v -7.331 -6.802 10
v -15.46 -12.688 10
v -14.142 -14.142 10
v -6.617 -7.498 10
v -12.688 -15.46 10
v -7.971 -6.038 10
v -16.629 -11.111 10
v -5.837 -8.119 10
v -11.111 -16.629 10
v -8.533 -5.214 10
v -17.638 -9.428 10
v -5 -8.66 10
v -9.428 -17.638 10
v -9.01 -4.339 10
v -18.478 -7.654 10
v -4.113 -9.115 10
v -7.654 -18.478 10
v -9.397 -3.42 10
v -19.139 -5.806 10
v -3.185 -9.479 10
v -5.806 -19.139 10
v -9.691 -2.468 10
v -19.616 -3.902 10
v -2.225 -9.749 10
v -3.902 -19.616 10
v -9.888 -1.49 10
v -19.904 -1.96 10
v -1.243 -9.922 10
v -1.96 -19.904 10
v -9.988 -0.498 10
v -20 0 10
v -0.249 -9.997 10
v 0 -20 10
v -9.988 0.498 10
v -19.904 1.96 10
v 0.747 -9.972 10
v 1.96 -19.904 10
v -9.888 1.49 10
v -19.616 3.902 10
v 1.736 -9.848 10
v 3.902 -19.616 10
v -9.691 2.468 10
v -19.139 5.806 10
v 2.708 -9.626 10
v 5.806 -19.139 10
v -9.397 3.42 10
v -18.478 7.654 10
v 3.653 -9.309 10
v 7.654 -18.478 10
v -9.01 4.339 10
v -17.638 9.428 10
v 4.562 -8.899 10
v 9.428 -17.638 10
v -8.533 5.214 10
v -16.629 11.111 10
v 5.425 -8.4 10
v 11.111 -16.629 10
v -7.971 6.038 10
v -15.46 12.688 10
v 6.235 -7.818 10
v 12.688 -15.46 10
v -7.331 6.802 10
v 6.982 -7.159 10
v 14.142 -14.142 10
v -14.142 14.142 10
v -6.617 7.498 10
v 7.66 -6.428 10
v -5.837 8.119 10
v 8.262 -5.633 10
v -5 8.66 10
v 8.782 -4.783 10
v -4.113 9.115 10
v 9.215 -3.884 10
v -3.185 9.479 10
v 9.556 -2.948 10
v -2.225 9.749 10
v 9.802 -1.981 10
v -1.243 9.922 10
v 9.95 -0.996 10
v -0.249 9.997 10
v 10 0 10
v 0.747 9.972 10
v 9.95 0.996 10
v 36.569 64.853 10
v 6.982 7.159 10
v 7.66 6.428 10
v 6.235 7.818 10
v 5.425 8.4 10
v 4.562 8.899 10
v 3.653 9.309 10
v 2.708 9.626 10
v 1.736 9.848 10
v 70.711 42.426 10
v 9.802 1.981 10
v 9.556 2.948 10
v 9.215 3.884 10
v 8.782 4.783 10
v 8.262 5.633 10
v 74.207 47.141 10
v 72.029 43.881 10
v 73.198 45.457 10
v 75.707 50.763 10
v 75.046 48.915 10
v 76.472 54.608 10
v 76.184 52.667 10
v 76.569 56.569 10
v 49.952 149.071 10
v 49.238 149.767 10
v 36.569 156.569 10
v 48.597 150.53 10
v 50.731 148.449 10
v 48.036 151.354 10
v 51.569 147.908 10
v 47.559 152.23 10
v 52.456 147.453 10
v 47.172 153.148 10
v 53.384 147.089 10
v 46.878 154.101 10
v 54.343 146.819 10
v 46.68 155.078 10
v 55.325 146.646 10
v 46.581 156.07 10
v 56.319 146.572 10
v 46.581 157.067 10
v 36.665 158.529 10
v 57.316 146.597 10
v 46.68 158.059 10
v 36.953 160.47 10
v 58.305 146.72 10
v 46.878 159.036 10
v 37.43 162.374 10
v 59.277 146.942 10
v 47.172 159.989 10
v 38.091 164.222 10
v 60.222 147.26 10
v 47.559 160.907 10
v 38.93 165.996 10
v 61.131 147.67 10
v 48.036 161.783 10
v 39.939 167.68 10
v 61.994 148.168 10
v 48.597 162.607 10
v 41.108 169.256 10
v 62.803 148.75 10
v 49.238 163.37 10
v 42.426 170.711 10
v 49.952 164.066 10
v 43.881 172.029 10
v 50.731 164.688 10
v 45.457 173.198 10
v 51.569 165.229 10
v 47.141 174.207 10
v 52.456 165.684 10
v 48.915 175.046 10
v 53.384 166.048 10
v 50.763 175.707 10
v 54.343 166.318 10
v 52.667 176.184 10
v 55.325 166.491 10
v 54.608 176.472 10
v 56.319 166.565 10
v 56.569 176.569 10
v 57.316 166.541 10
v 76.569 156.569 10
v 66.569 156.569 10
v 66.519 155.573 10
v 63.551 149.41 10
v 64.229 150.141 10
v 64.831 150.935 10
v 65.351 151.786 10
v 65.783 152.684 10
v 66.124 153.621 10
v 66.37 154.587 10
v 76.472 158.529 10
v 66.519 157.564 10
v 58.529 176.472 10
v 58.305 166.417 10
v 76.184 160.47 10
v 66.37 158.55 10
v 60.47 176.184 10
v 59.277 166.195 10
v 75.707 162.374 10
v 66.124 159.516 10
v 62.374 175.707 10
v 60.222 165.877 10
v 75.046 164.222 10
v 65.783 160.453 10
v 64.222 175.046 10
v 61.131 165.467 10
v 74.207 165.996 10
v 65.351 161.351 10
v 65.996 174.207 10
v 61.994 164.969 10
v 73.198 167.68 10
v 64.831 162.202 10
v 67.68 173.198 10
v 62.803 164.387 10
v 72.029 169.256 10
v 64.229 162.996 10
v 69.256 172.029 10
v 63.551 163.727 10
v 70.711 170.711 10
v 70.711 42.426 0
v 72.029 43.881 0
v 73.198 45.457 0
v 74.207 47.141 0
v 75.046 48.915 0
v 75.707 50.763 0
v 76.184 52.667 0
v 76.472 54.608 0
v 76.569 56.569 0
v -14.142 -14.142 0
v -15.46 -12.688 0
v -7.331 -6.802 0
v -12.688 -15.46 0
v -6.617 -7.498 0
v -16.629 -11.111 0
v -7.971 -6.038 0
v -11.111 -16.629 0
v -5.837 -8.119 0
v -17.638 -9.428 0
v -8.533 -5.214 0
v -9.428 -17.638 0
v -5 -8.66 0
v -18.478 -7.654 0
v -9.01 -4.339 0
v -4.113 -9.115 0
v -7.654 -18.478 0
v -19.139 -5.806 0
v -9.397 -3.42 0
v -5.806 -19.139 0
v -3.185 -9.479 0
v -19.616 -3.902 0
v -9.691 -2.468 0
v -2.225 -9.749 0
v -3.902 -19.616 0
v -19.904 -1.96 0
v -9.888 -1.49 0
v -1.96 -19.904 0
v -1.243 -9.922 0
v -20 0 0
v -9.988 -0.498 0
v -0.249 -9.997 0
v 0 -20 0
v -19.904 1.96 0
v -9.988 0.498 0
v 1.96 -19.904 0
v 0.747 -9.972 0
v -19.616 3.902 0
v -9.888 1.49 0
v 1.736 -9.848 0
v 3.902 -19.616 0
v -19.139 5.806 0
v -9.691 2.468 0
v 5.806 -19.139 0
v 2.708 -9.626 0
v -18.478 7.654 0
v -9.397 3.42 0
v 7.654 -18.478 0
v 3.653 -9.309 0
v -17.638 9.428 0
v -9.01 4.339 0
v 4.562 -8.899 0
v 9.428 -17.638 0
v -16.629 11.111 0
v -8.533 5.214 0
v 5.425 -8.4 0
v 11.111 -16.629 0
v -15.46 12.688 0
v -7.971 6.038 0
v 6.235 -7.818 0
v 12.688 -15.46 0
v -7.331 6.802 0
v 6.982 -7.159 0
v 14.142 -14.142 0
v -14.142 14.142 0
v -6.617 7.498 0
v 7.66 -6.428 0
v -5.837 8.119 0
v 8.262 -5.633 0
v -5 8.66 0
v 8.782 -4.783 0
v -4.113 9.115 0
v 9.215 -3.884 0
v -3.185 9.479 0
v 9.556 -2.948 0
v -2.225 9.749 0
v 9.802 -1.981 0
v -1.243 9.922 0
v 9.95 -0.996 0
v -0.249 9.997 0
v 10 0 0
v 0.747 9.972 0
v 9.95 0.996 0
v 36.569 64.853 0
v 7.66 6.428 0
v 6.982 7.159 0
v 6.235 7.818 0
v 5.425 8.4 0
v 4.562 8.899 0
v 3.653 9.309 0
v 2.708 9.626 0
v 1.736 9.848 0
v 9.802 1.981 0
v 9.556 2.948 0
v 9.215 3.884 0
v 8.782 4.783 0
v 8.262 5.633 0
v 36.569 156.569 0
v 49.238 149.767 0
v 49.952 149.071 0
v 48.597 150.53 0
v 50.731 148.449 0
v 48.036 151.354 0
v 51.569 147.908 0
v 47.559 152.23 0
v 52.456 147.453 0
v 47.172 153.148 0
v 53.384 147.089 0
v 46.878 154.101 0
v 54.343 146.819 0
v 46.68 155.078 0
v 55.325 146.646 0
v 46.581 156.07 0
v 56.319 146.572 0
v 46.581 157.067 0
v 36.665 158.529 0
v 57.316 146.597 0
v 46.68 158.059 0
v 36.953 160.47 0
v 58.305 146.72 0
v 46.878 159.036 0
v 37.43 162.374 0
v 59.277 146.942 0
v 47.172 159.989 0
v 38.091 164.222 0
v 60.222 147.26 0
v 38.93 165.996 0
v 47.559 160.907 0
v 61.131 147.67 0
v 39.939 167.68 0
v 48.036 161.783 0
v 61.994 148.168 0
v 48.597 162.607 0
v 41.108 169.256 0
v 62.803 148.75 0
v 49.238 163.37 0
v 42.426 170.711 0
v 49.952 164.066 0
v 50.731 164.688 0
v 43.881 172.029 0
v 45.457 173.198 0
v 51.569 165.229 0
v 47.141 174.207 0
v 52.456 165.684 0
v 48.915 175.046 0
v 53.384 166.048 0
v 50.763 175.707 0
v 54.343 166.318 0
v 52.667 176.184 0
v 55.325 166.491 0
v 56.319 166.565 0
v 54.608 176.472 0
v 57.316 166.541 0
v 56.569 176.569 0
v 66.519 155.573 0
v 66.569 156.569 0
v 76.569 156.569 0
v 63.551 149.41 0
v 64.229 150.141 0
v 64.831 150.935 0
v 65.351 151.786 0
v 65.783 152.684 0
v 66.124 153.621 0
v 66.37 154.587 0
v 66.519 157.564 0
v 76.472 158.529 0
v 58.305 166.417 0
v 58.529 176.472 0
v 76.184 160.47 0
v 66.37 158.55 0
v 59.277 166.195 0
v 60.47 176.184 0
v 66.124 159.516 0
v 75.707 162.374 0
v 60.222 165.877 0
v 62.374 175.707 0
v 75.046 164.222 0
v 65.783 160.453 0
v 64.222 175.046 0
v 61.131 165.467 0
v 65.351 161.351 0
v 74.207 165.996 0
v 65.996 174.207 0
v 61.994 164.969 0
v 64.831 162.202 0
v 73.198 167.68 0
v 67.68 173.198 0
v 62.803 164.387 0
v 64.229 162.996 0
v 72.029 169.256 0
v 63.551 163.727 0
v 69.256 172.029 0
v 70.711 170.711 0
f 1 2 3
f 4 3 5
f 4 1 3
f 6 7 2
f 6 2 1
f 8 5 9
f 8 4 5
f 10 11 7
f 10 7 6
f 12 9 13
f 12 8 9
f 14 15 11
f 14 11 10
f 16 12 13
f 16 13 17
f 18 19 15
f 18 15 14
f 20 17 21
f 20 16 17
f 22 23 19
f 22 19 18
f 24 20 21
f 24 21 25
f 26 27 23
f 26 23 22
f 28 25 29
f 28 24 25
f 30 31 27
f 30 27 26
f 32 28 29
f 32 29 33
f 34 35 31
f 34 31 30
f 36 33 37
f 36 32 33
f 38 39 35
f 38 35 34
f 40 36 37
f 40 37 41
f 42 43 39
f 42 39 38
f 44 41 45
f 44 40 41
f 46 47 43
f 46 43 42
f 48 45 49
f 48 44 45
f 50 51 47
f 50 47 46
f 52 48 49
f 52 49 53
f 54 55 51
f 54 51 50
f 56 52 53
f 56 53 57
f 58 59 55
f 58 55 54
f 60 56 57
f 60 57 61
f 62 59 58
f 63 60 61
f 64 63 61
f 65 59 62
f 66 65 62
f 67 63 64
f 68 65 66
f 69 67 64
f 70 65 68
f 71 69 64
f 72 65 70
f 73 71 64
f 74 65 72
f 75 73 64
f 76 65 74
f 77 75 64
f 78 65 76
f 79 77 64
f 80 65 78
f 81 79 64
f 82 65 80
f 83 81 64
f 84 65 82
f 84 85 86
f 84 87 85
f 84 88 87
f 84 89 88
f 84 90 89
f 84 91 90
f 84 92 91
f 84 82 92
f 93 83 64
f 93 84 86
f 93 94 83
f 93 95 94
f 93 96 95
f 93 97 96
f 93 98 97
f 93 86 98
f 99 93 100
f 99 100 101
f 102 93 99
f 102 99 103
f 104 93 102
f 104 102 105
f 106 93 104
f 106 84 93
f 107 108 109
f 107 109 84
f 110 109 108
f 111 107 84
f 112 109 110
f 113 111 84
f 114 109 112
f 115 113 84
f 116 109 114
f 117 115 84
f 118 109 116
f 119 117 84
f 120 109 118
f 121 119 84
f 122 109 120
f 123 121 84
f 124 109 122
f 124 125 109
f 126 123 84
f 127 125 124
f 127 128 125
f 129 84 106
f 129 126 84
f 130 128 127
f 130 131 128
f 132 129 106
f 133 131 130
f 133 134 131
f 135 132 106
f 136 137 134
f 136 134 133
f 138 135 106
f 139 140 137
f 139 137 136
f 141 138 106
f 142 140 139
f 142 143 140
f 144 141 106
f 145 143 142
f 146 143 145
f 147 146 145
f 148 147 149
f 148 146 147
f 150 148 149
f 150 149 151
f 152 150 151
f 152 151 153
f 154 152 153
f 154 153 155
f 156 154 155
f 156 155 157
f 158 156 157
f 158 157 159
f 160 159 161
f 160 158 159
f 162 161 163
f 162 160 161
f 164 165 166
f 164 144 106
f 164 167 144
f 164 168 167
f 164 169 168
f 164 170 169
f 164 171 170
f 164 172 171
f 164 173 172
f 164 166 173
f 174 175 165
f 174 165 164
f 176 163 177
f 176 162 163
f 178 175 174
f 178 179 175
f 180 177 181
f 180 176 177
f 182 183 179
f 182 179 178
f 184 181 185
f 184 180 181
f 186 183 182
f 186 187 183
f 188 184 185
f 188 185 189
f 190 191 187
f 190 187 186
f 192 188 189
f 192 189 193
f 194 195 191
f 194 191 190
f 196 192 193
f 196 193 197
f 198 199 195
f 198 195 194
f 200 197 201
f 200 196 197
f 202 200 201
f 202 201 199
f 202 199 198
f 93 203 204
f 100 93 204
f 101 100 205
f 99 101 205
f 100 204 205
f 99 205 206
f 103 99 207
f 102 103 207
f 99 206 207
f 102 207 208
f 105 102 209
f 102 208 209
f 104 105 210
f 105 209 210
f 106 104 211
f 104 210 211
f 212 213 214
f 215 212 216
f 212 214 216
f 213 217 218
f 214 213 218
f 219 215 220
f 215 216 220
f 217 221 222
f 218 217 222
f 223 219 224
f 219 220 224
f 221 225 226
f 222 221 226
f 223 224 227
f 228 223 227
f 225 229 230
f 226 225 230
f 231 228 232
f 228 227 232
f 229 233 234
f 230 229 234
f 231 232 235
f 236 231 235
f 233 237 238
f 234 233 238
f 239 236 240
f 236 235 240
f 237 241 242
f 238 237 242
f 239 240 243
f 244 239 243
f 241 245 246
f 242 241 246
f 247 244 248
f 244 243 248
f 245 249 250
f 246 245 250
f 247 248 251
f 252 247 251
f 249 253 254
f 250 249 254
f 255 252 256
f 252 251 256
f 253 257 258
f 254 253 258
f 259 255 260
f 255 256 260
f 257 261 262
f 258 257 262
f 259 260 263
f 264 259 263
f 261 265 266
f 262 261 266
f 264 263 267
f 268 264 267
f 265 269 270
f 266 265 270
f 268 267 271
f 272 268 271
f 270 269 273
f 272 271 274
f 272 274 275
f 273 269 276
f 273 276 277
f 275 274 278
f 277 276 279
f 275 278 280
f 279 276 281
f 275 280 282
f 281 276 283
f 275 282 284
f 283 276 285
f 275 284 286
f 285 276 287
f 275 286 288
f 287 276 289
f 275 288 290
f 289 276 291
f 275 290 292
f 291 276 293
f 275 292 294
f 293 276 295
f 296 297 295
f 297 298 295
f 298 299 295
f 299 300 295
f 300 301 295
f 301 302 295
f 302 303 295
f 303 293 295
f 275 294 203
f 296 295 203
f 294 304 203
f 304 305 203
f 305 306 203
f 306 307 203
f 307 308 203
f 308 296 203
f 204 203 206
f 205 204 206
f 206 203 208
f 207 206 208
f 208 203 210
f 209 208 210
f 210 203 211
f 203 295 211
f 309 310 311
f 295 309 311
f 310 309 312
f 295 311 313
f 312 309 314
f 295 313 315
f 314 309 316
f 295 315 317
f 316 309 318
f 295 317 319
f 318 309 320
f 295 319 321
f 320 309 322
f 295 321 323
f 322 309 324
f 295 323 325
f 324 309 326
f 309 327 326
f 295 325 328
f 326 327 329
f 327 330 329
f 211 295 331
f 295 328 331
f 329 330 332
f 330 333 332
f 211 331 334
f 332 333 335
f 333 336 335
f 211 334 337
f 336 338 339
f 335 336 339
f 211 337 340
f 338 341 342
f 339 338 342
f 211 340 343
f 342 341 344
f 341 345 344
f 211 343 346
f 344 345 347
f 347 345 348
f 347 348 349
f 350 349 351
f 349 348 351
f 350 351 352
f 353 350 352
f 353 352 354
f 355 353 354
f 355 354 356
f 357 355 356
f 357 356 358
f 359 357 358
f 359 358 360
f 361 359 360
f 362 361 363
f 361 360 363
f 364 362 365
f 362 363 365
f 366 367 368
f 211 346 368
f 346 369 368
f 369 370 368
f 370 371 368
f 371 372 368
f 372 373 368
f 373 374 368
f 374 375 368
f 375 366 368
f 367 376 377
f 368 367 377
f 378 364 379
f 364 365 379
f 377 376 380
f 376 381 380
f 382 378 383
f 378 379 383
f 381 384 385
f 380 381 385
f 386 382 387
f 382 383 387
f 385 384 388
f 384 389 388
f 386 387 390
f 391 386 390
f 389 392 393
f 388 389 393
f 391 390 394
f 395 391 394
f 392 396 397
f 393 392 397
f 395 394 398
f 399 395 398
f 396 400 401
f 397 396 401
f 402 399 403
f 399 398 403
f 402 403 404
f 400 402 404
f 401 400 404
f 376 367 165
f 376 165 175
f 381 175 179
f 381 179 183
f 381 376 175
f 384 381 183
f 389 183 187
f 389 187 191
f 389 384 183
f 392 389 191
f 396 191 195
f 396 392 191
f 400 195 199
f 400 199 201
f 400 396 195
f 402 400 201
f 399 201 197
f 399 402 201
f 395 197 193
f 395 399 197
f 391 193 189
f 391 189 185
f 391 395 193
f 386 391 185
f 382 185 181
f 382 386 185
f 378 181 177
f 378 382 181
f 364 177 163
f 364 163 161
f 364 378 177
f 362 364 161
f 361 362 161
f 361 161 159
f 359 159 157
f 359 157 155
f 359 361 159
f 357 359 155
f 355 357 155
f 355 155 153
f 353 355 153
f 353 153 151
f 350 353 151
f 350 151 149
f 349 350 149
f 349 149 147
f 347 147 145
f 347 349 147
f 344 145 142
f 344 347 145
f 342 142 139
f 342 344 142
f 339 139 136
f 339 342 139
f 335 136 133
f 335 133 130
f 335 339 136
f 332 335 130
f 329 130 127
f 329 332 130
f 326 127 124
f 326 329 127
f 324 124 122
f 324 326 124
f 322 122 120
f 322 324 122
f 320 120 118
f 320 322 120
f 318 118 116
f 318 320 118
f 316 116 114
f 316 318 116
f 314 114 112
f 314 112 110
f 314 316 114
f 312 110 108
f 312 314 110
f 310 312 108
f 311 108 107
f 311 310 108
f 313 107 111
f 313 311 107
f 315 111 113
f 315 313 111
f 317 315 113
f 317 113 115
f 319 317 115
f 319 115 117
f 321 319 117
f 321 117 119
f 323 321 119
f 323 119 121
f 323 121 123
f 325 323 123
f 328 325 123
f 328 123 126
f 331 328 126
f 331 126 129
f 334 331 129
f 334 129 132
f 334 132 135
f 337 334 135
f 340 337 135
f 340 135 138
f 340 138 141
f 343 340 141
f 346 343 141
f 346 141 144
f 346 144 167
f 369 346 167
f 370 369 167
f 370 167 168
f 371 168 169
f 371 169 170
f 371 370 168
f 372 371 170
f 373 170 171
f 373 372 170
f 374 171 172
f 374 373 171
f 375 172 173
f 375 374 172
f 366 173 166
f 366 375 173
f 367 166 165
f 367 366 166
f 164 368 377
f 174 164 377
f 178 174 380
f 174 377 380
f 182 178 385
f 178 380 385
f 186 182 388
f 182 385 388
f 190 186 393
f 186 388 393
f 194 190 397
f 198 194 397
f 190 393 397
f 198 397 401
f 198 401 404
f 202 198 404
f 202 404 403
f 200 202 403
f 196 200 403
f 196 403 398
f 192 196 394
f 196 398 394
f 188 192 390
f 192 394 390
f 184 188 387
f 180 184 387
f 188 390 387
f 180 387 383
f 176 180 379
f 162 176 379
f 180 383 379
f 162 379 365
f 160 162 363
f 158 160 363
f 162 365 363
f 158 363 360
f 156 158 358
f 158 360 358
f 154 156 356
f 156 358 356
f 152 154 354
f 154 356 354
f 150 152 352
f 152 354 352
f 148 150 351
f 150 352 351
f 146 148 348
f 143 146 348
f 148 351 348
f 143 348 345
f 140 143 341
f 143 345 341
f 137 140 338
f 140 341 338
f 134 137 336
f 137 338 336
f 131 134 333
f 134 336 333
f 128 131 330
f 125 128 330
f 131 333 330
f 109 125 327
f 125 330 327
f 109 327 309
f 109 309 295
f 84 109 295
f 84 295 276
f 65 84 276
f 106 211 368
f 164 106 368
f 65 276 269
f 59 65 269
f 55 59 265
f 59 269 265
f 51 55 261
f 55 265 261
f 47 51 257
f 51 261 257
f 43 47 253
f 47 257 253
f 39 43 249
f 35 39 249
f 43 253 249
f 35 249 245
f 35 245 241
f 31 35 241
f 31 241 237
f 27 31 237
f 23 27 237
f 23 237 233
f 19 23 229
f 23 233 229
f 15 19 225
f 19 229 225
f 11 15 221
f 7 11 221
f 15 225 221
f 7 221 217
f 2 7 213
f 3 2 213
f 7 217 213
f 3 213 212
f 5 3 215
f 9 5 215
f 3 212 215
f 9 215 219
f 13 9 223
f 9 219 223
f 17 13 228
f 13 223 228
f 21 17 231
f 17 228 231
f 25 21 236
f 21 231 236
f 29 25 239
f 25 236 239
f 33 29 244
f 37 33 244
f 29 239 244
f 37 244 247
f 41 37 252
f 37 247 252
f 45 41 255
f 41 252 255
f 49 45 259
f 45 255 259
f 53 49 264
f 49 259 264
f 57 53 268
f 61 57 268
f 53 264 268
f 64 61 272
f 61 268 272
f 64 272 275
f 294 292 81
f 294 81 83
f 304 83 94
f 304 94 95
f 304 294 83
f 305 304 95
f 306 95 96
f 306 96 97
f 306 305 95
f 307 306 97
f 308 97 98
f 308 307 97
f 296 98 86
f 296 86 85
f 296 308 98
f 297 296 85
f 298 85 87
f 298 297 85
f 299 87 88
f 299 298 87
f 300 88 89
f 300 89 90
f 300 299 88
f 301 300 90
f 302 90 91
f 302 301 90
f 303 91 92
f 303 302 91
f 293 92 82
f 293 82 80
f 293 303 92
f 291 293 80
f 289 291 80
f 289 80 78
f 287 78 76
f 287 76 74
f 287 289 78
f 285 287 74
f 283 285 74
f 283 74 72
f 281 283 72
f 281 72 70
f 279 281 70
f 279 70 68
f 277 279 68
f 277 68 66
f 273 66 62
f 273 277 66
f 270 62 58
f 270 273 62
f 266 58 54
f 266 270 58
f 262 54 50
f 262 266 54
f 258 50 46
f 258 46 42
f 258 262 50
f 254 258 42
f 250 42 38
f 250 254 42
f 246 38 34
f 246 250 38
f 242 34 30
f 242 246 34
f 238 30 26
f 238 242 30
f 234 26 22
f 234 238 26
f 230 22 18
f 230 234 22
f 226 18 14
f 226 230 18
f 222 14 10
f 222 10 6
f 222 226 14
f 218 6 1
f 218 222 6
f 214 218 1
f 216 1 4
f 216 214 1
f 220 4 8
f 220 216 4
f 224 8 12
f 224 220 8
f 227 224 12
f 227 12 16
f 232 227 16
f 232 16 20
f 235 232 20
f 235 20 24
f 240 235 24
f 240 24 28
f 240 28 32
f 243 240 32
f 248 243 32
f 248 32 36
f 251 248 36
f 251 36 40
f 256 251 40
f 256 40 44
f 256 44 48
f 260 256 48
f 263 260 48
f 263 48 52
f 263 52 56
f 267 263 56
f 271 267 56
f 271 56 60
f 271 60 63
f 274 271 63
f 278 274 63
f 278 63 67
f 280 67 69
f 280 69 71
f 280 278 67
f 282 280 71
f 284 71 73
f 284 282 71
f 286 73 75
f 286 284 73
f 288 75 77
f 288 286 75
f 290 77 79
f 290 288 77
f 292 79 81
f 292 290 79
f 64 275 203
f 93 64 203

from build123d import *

# Parameters (mm, degrees)
ESQUISSE1_R        = 10
BOSS_EXTRU_1_DEPTH = 10


with BuildPart() as part:
    # Esquisse1 → Boss.-Extru.1 (new body)
    # profile 1 of 3: a face of its own
    with BuildSketch(Plane.XY):
        with BuildLine():
            Line((36.568542495, 156.568542495), (36.568542495, 64.852813742))
            Line((36.568542495, 64.852813742), (42.426406871, 70.710678119))
            ThreePointArc((42.426406871, 70.710678119), (64.222211142, 75.046133145), (76.568542495, 56.568542495))
            Line((76.568542495, 56.568542495), (76.568542495, 156.568542495))
            ThreePointArc((76.568542495, 156.568542495), (56.568542495, 176.568542495), (36.568542495, 156.568542495))
        make_face()
        with Locations((56.568542495, 156.568542495)):
            Circle(ESQUISSE1_R, mode=Mode.SUBTRACT)
    # profile 2 of 3: a face of its own
    with BuildSketch(Plane.XY):
        with BuildLine():
            Line((42.426406871, 70.710678119), (36.568542495, 64.852813742))
            Line((36.568542495, 64.852813742), (36.568542495, 56.568542495))
            ThreePointArc((36.568542495, 56.568542495), (48.914873848, 38.090951845), (70.710678119, 42.426406871))
            ThreePointArc((70.710678119, 42.426406871), (75.046133145, 48.914873848), (76.568542495, 56.568542495))
            ThreePointArc((76.568542495, 56.568542495), (64.222211142, 75.046133145), (42.426406871, 70.710678119))
        make_face()
    # profile 3 of 3: a face of its own
    with BuildSketch(Plane.XY):
        with BuildLine():
            Line((36.568542495, 64.852813742), (-14.142135624, 14.142135624))
            ThreePointArc((-14.142135624, 14.142135624), (-14.142135624, -14.142135624), (14.142135624, -14.142135624))
            Line((14.142135624, -14.142135624), (70.710678119, 42.426406871))
            ThreePointArc((70.710678119, 42.426406871), (48.914873848, 38.090951845), (36.568542495, 56.568542495))
            Line((36.568542495, 56.568542495), (36.568542495, 64.852813742))
        make_face()
        Circle(ESQUISSE1_R, mode=Mode.SUBTRACT)
    extrude(amount=BOSS_EXTRU_1_DEPTH)


solid = part.part
